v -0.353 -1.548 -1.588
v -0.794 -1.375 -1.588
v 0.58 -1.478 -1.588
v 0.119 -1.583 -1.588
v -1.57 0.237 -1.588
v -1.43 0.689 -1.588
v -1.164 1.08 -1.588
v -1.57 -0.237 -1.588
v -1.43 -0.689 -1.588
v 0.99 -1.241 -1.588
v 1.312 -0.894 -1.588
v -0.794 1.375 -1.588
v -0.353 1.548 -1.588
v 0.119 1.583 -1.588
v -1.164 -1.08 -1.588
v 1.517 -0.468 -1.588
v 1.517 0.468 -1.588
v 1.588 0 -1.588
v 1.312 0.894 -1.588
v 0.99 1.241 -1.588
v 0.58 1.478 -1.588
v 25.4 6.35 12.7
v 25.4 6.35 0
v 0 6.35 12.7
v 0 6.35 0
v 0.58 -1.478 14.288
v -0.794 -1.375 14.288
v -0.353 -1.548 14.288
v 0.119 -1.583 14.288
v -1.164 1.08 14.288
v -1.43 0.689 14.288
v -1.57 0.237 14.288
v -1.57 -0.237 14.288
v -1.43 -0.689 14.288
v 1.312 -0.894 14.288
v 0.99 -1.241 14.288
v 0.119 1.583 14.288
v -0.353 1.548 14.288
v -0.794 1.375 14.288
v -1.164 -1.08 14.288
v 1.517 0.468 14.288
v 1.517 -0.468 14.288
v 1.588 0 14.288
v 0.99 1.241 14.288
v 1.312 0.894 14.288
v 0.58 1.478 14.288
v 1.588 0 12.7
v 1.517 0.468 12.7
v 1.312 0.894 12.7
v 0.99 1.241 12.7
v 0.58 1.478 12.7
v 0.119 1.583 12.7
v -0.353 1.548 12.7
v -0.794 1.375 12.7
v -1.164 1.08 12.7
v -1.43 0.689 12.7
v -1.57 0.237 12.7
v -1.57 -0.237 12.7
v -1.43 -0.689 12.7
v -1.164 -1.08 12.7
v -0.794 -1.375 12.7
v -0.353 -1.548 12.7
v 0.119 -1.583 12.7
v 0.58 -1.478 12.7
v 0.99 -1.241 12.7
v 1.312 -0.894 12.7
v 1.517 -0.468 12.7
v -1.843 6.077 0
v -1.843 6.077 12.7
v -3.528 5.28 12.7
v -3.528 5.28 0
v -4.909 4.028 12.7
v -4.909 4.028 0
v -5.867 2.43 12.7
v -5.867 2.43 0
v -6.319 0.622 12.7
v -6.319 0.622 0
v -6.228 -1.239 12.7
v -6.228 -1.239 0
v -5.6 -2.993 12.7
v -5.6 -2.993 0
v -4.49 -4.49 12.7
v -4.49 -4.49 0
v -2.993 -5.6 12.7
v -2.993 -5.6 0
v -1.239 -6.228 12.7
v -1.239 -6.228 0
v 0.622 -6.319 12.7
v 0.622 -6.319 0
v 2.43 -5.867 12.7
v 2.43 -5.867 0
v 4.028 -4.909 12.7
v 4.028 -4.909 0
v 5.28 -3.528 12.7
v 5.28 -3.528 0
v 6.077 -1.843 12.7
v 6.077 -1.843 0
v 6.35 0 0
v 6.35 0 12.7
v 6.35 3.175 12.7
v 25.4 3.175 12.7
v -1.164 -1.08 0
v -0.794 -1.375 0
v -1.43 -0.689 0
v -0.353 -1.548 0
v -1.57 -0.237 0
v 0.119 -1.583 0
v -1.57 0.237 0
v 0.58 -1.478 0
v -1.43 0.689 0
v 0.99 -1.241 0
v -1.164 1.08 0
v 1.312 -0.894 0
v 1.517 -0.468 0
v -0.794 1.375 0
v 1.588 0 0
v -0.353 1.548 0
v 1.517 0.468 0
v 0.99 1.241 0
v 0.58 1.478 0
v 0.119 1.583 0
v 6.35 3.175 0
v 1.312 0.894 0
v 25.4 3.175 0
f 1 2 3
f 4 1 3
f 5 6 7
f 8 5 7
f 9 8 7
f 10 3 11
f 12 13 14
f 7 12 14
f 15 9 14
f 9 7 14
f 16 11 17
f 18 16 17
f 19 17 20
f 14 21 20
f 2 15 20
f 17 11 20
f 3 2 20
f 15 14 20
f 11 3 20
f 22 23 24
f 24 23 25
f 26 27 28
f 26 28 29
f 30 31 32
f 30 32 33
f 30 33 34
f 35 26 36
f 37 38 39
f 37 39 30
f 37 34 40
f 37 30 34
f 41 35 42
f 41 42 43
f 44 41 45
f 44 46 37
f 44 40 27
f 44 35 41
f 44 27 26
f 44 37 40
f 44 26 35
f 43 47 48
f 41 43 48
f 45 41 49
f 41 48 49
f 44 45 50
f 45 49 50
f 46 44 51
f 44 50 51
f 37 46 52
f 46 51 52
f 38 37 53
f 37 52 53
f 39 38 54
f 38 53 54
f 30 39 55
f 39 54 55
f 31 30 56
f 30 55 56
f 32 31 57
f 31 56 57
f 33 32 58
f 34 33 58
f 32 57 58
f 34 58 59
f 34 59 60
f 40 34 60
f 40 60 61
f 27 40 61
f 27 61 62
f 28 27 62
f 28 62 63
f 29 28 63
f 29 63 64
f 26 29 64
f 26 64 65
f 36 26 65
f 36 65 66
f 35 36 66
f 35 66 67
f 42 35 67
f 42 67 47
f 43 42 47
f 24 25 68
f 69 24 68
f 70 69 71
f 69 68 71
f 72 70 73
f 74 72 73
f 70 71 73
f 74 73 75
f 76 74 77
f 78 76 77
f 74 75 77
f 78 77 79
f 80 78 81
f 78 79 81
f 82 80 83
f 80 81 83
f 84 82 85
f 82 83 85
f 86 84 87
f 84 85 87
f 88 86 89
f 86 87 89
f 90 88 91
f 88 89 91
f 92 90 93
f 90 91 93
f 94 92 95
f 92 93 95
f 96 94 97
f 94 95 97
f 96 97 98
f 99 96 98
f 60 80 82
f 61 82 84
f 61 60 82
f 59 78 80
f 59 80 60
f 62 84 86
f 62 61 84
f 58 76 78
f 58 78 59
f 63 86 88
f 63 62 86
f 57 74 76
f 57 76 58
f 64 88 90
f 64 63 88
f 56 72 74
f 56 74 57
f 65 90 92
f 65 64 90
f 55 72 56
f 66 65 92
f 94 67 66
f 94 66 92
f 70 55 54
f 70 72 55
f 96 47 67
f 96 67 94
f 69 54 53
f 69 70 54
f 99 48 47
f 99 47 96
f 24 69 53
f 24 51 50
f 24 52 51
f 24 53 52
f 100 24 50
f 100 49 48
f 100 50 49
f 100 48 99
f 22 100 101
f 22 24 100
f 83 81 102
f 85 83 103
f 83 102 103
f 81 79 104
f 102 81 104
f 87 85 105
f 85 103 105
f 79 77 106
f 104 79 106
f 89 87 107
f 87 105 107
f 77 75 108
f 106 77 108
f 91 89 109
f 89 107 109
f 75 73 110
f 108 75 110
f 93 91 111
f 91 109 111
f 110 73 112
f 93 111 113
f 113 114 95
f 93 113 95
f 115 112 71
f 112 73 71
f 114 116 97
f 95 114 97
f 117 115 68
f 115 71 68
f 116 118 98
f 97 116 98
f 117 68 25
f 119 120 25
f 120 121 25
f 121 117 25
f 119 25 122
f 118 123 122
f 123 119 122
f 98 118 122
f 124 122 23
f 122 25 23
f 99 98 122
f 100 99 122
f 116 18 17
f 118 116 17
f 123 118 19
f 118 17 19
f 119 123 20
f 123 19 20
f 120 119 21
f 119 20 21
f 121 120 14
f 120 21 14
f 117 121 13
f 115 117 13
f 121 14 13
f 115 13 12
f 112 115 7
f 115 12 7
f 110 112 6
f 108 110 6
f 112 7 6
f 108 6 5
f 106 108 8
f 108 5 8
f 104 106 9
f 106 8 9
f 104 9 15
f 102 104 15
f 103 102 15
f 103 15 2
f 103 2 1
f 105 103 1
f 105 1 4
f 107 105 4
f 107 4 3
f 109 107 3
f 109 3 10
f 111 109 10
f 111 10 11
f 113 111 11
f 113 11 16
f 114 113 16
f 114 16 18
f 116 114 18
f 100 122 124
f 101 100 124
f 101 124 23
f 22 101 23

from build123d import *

# Parameters (mm, degrees)
SKETCH1_R                = 1.5875
BOSS_EXTRUDE1_DEPTH      = 12.7
BOSS_EXTRUDE2_DEPTH      = 14.2875
BOSS_EXTRUDE2_DEPTH_BACK = 1.5875
SKETCH1_3_R              = 1.5875


with BuildPart() as part:
    # Sketch1 → Boss-Extrude1 (new body)
    with BuildSketch(Plane.XY):
        with BuildLine():
            Line((25.4, 6.35), (0, 6.35))
            ThreePointArc((0, 6.35), (-4.490128061, -4.490128061), (6.35, 0))
            Line((6.35, 0), (6.35, 3.175))
            Line((6.35, 3.175), (25.4, 3.175))
            Line((25.4, 3.175), (25.4, 6.35))
        make_face()
        Circle(SKETCH1_R, mode=Mode.SUBTRACT)
    extrude(amount=BOSS_EXTRUDE1_DEPTH)

    # Sketch1<3> → Boss-Extrude2 (add, two sides: drawn at the far end of the back side and taken through both)
    with BuildSketch(Plane.XY.offset(-BOSS_EXTRUDE2_DEPTH_BACK)):
        Circle(SKETCH1_3_R)
    extrude(amount=BOSS_EXTRUDE2_DEPTH + BOSS_EXTRUDE2_DEPTH_BACK)


solid = part.part
